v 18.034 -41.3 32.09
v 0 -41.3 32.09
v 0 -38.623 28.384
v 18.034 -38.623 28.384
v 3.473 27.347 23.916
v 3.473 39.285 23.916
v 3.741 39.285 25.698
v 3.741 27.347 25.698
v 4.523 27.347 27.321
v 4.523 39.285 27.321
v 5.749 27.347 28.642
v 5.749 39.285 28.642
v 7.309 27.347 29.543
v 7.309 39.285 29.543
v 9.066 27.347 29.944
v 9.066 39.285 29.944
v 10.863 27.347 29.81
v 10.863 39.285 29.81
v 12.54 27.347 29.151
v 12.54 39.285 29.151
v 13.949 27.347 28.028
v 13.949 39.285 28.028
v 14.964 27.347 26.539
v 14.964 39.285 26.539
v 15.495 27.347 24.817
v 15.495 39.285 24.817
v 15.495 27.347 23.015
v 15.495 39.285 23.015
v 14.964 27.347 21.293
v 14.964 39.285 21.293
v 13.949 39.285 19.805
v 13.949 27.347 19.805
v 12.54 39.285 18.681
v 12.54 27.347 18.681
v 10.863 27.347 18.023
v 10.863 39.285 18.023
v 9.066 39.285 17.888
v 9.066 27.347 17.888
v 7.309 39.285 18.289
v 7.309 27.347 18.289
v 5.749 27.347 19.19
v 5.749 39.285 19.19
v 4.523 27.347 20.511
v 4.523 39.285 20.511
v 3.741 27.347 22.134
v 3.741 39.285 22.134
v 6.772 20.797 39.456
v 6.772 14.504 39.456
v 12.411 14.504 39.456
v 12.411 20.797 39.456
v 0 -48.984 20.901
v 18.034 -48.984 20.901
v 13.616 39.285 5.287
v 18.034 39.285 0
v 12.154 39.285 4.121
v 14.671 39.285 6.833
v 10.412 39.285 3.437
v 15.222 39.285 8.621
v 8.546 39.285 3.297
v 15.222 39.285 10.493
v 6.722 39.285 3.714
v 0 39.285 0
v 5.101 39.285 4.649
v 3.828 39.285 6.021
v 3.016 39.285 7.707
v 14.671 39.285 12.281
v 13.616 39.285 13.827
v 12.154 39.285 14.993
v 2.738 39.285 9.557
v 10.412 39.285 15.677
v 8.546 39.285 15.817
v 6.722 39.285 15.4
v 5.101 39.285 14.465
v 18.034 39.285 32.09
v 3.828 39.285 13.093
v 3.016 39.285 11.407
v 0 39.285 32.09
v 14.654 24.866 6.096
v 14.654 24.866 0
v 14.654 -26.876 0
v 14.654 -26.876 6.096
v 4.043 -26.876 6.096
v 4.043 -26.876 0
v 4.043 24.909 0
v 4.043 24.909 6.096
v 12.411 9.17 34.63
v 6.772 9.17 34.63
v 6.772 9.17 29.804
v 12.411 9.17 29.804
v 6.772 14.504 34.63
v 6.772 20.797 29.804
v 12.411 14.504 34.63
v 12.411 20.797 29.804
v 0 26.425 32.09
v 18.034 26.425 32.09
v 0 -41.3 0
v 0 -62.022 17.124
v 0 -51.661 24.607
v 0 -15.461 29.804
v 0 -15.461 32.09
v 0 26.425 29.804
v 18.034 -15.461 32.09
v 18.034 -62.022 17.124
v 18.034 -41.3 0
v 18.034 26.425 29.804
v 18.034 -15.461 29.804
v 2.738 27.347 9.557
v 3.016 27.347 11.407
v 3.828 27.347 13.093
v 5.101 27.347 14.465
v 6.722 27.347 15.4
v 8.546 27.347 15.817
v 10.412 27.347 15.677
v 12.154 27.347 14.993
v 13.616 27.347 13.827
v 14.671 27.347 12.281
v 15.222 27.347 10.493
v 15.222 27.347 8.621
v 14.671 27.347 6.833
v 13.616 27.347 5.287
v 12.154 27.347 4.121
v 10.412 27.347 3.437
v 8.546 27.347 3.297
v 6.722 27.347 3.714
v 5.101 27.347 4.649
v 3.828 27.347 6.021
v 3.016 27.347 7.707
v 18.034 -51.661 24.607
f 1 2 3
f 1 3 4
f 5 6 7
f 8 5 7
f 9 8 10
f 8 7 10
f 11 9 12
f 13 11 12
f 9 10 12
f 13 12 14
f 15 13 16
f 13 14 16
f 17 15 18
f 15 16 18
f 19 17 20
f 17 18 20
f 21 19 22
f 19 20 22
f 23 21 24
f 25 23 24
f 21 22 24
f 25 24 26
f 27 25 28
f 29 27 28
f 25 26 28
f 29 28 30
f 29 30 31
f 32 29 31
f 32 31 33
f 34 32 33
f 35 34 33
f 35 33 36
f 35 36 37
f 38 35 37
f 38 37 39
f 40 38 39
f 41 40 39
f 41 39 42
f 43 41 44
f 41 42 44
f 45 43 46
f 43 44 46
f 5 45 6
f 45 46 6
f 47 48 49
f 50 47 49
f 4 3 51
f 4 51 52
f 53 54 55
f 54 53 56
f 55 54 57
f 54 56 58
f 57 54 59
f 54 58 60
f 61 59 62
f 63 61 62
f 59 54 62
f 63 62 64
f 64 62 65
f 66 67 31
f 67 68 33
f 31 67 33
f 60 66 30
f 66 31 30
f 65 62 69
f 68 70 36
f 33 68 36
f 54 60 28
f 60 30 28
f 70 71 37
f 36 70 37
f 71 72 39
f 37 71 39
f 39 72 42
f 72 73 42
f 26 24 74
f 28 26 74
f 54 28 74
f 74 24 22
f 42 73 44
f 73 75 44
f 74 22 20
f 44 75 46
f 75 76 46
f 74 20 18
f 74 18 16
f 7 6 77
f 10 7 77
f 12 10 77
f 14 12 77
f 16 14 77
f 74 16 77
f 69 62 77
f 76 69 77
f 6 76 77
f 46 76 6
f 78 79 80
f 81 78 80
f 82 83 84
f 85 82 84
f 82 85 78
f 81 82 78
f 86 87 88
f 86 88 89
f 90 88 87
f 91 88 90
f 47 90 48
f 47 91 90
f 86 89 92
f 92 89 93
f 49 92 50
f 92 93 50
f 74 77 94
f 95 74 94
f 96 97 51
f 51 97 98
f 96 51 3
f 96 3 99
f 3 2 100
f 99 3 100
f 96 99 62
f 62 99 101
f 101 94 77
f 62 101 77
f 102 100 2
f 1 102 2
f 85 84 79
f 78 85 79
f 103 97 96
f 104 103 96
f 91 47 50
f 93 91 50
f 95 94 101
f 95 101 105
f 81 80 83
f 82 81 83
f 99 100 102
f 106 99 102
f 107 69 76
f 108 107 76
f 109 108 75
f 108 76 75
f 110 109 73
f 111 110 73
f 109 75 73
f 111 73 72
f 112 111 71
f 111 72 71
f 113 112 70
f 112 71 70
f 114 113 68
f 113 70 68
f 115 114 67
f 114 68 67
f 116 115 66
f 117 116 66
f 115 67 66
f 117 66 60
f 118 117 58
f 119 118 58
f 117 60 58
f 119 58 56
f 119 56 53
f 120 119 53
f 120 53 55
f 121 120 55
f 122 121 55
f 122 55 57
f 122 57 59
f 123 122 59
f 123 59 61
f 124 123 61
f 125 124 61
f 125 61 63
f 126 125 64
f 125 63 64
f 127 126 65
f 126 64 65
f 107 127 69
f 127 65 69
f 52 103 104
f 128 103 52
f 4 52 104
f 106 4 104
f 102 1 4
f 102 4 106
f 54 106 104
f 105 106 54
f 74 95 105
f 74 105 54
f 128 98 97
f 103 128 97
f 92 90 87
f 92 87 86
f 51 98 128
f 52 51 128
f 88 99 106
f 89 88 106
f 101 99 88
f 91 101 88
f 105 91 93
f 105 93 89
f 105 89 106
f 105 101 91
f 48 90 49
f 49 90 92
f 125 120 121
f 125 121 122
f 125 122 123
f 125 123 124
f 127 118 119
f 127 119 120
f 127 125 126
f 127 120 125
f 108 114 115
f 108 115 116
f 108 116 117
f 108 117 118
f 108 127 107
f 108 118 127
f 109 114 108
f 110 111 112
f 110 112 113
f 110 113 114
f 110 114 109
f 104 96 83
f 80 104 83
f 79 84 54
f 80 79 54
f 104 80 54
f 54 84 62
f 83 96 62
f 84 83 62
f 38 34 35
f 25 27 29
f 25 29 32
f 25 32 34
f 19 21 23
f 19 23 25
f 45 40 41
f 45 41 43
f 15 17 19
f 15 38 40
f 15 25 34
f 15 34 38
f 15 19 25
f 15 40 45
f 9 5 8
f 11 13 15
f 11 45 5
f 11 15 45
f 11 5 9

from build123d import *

# Parameters (mm, degrees)
F1_DEPTH  = 18.034
F2_R      = 6.0450244322
F2_R_2    = 6.2773017577
F3_DEPTH  = 11.938
F4_W      = 18.034
F4_H      = 12.7806511284
F5_DEPTH  = 4.572
F7_DEPTH  = 6.096
F8_W      = 18.034
F8_H      = 41.8857587501
F9_DEPTH  = 2.286
F10_W     = 5.6385421194
F10_H     = 6.2931925058
F11_DEPTH = 9.652
F12_W     = 5.6385421194
F12_H     = 4.826
F13_DEPTH = 5.334


with BuildPart() as f1:
    # F0 (on Right) → F1 (new body)
    with BuildSketch(Plane.YZ):
        Polygon((39.2854847014, 32.0903435349), (-41.3001254201, 32.0903435349), (-62.0221421123, 17.1244423836), (-41.3001254201, 0), (39.2854847014, 0), align=None)
    extrude(amount=F1_DEPTH)

    # F2 (on face) → F3 (cut)
    with BuildSketch(Plane(origin=(0, 39.2854847014, 0), x_dir=(-1, 0, 0), z_dir=(0, 1, 0))):
        with Locations((-9.5175812021, 23.9161904901)):
            Circle(F2_R)
        with Locations((-9.0148737654, 9.5570040867)):
            Circle(F2_R_2)
    extrude(amount=-F3_DEPTH, mode=Mode.SUBTRACT)

    # F4 (on face) → F5 (cut)
    with BuildSketch(Plane(origin=(0, -29.3891718919, 40.6926989799), x_dir=(1, 0, 0), z_dir=(0, -0.5854905592, 0.8106792246))):
        with Locations((9.017, -21.0828860338)):
            Rectangle(F4_W, F4_H)
    extrude(amount=-F5_DEPTH, mode=Mode.SUBTRACT)

    # F6 (on face) → F7 (cut)
    with BuildSketch(Plane(origin=(0, 0, 0), x_dir=(1, 0, 0), z_dir=(0, 0, -1))):
        Polygon((4.0432531387, 26.875609532), (4.0432531387, -24.9088313431), (14.6540477872, -24.865726009), (14.6540477872, 26.875609532), align=None)
    extrude(amount=-F7_DEPTH, mode=Mode.SUBTRACT)

    # F8 (on face) → F9 (cut)
    with BuildSketch(Plane.XY.offset(32.0903435349)):
        with Locations((9.017, 5.4818768986)):
            Rectangle(F8_W, F8_H)
    extrude(amount=-F9_DEPTH, mode=Mode.SUBTRACT)

    # F10 (on face) → F11 (join)
    with BuildSketch(Plane.XY.offset(29.8043435349)):
        with Locations((9.5915335696, 17.6502466202)):
            Rectangle(F10_W, F10_H)
    extrude(amount=F11_DEPTH)

    # F12 (on face) → F13 (join)
    with BuildSketch(Plane.XZ.offset(-14.5036503673)):
        with Locations((9.5915335696, 32.2173435349)):
            Rectangle(F12_W, F12_H)
    extrude(amount=F13_DEPTH)


solid = f1.part
